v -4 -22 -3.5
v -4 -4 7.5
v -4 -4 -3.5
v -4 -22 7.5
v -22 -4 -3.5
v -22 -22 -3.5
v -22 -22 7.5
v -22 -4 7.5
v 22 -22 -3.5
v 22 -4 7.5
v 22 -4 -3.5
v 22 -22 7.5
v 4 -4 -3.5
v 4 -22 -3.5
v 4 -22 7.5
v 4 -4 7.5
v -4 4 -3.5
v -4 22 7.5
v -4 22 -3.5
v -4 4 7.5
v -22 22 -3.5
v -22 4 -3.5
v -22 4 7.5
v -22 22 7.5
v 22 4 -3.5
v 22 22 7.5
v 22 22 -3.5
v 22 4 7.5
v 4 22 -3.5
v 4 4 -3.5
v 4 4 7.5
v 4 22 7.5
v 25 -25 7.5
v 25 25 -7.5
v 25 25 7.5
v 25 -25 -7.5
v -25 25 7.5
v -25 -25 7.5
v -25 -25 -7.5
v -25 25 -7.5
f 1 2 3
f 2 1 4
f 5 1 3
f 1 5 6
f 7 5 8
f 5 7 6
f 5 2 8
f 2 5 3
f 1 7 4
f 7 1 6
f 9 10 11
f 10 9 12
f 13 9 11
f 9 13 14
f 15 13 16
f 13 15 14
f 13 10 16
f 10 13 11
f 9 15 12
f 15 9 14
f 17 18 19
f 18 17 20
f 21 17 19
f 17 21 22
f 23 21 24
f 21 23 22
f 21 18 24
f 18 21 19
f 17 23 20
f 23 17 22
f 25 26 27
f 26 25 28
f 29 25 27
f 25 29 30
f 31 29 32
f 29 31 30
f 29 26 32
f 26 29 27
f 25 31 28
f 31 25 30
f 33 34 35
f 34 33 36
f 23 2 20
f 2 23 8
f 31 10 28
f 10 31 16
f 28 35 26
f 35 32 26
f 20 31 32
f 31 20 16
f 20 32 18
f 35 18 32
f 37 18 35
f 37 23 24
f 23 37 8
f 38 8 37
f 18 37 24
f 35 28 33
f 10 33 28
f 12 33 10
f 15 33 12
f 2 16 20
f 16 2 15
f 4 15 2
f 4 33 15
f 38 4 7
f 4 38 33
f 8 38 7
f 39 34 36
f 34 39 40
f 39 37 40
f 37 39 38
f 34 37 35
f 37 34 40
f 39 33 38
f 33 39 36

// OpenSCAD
$fn = 32;

// ----------------------------------------------------------------------
// Pocket plate 50 x 50 x 15
// 2 x 2 pockets 18 mm square, 11 mm deep
// ----------------------------------------------------------------------

// --- parameters (mm) ---
thickness = 15;  // plate thickness
floor_t = 4;     // material left under each pocket
pocket = 18;     // pocket side length
pitch_x = 26;    // pocket pitch along X
pitch_y = 26;    // pocket pitch along Y
cols = 2;        // pockets per row
rows = 2;        // rows of pockets

// --- derived feature positions (mm) ---
depth = thickness - floor_t;        // = 11   pocket depth, down to the floor
span_x = (cols - 1) * pitch_x;      // = 26   distance between outer pockets
span_y = (rows - 1) * pitch_y;      // = 26   distance between outer pocket rows
origin_x = -span_x / 2;             // = -13   X of the first pocket
origin_y = -span_y / 2;             // = -13   Y of the first pocket
plate = [span_x + pocket + 6, span_y + pocket + 6, thickness];  // = [50, 50, 15]   overall size: pockets plus 3 mm of wall on each side
feature_centers = [
  [origin_x + 0 * pitch_x, origin_y + 0 * pitch_y],
  [origin_x + 1 * pitch_x, origin_y + 0 * pitch_y],
  [origin_x + 0 * pitch_x, origin_y + 1 * pitch_y],
  [origin_x + 1 * pitch_x, origin_y + 1 * pitch_y]
];   // pocket centres, used verbatim by the cutter loop

// plate outline, then one pocket per centre in feature_centers
difference() {
  cube(plate, center = true);
  for (centre = feature_centers)
    translate([centre[0] - pocket / 2, centre[1] - pocket / 2, plate[2] / 2 - depth])
      cube([pocket, pocket, depth + 1]);  // centred on the declared pocket centre
}
